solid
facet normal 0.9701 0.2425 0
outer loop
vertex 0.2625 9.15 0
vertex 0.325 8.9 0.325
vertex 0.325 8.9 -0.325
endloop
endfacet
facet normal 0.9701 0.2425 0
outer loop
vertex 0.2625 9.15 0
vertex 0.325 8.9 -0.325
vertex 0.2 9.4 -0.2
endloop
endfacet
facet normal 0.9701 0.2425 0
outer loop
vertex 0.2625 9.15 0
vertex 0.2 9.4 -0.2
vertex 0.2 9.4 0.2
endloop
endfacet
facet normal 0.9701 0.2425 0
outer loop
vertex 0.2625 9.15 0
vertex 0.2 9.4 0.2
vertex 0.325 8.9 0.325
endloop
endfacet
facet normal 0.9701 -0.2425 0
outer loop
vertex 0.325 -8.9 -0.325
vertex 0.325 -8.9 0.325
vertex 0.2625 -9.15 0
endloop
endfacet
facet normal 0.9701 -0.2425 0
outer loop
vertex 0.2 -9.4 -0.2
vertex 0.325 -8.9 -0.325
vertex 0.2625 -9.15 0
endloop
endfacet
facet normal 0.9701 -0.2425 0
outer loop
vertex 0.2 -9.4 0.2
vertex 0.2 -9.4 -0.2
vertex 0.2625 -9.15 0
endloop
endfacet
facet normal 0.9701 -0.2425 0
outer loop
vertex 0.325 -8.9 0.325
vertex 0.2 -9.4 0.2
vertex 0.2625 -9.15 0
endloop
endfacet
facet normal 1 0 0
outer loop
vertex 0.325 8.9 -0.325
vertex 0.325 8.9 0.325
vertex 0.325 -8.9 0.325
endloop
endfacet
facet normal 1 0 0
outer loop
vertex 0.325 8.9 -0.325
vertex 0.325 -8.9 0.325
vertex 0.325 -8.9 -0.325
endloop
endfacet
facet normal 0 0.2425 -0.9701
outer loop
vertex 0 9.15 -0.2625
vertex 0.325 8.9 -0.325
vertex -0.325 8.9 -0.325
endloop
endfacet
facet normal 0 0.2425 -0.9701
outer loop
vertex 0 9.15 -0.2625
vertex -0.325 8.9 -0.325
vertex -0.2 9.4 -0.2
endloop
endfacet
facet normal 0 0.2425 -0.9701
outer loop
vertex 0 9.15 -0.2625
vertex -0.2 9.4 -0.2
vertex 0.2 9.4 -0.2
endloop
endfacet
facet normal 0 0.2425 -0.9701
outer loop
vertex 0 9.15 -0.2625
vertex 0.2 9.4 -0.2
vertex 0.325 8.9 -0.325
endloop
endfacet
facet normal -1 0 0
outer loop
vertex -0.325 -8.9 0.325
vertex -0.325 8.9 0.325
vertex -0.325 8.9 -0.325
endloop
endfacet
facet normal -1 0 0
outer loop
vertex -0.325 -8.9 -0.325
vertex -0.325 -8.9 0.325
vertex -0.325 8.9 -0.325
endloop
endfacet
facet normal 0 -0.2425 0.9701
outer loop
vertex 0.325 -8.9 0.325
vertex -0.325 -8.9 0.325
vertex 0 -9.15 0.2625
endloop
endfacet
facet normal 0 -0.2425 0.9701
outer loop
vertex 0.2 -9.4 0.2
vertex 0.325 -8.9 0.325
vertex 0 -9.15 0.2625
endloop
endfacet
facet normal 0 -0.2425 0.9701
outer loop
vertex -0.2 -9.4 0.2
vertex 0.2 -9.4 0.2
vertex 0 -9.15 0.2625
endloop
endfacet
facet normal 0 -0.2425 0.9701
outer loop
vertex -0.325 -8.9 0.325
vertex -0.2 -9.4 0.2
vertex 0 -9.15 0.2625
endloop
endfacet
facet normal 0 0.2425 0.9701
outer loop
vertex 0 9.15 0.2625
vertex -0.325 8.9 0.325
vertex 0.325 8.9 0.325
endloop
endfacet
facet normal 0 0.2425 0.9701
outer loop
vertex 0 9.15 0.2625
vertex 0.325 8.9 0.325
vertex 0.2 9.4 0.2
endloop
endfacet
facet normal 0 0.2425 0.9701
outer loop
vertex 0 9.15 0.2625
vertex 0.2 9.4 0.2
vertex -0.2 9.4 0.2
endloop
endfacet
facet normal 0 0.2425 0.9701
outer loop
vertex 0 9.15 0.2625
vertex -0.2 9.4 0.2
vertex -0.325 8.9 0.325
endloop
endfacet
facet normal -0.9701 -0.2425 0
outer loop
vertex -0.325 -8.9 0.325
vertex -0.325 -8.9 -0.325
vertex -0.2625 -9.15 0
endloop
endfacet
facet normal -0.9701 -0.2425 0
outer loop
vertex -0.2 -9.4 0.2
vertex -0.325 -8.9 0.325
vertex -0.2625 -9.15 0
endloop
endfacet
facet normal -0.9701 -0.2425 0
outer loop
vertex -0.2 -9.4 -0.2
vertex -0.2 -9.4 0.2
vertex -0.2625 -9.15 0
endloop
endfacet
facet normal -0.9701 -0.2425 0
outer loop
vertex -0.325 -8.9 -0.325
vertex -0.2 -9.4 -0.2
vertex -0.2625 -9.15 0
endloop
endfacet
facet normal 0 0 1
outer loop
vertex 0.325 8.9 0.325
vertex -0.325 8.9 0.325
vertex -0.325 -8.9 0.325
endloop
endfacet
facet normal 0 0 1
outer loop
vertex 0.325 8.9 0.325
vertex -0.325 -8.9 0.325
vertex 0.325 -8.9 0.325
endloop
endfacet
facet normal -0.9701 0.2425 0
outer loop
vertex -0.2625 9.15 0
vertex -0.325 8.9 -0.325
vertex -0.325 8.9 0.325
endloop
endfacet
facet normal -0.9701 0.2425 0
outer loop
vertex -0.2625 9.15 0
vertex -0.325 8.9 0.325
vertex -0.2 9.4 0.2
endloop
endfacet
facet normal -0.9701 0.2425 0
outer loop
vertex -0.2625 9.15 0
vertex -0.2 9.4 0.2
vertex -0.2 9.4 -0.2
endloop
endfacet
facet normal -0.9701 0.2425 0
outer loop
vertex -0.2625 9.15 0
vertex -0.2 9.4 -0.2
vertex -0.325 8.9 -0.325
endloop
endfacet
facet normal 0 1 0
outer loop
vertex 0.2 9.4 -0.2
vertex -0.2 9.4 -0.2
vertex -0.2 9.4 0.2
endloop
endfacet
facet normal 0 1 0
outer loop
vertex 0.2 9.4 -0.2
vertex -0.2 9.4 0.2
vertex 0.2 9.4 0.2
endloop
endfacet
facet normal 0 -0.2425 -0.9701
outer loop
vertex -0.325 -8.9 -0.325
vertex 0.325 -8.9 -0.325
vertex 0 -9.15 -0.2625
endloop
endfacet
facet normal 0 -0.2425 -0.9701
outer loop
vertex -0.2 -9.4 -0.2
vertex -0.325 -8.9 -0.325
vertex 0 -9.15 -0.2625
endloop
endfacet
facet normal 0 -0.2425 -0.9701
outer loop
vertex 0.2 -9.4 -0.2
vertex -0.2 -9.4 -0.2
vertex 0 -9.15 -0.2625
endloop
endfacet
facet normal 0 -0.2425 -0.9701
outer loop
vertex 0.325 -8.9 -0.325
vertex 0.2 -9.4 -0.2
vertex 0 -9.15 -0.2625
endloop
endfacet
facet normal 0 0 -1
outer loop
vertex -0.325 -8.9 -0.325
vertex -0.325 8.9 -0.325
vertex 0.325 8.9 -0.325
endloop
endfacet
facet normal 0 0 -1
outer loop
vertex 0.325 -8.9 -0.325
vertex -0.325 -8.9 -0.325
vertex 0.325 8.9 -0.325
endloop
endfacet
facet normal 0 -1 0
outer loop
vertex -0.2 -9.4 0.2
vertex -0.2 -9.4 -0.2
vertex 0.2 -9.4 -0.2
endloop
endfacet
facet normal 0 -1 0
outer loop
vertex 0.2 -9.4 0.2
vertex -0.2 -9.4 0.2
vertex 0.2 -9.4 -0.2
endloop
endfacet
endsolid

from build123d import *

# Parameters (mm, degrees)
SKETCH1_W           = 0.65
SKETCH1_H           = 0.65
BOSS_EXTRUDE1_DEPTH = 9.4
CUT_EXTRUDE1_REACH  = 20.306
SKETCH3_W           = 0.65
SKETCH3_H           = 0.65


with BuildPart() as part:
    # Sketch1 → Boss-Extrude1 (new, symmetric)
    with BuildSketch(Plane(origin=(0, 0, 0), x_dir=(1, 0, 0), z_dir=(0, 1, 0))):
        Rectangle(SKETCH1_W, SKETCH1_H)
    extrude(amount=BOSS_EXTRUDE1_DEPTH, both=True)

    # Sketch3 → Cut-Extrude1 (cut, up to next)
    with BuildSketch(Plane(origin=(0, 8.9, 0), x_dir=(1, 0, 0), z_dir=(0, 1, 0)), mode=Mode.PRIVATE) as cut_extrude1_sk1:
        Rectangle(SKETCH3_W, SKETCH3_H)
    cut_extrude1_tool1 = extrude(cut_extrude1_sk1.sketch, amount=CUT_EXTRUDE1_REACH, mode=Mode.PRIVATE) & part.part
    cut_extrude1 = cut_extrude1_tool1.solids().sort_by_distance((0, 8.9, 0))[0]
    add(cut_extrude1, mode=Mode.SUBTRACT)

    # Sketch3<3> → Loft1 section 0
    with BuildSketch(Plane(origin=(0, 8.9, 0), x_dir=(1, 0, 0), z_dir=(0, 1, 0))):
        with BuildLine():
            Line((0.325, -0.325), (-0.325, -0.325))
            Line((-0.325, -0.325), (-0.325, 0.325))
            Line((-0.325, 0.325), (0.325, 0.325))
            Line((0.325, 0.325), (0.325, -0.325))
        make_face()
    # Sketch2 → Loft1 section 1
    with BuildSketch(Plane(origin=(0, 9.4, 0), x_dir=(1, 0, 0), z_dir=(0, 1, 0))):
        with BuildLine():
            Line((-0.2, -0.2), (0.2, -0.2))
            Line((0.2, -0.2), (0.2, 0.2))
            Line((0.2, 0.2), (-0.2, 0.2))
            Line((-0.2, 0.2), (-0.2, -0.2))
        make_face()
    loft1 = loft()

    # Mirror1: Cut-Extrude1, Loft1 across plane
    add(cut_extrude1.mirror(Plane.ZX), mode=Mode.SUBTRACT)
    add(loft1.mirror(Plane.ZX))


solid = part.part
